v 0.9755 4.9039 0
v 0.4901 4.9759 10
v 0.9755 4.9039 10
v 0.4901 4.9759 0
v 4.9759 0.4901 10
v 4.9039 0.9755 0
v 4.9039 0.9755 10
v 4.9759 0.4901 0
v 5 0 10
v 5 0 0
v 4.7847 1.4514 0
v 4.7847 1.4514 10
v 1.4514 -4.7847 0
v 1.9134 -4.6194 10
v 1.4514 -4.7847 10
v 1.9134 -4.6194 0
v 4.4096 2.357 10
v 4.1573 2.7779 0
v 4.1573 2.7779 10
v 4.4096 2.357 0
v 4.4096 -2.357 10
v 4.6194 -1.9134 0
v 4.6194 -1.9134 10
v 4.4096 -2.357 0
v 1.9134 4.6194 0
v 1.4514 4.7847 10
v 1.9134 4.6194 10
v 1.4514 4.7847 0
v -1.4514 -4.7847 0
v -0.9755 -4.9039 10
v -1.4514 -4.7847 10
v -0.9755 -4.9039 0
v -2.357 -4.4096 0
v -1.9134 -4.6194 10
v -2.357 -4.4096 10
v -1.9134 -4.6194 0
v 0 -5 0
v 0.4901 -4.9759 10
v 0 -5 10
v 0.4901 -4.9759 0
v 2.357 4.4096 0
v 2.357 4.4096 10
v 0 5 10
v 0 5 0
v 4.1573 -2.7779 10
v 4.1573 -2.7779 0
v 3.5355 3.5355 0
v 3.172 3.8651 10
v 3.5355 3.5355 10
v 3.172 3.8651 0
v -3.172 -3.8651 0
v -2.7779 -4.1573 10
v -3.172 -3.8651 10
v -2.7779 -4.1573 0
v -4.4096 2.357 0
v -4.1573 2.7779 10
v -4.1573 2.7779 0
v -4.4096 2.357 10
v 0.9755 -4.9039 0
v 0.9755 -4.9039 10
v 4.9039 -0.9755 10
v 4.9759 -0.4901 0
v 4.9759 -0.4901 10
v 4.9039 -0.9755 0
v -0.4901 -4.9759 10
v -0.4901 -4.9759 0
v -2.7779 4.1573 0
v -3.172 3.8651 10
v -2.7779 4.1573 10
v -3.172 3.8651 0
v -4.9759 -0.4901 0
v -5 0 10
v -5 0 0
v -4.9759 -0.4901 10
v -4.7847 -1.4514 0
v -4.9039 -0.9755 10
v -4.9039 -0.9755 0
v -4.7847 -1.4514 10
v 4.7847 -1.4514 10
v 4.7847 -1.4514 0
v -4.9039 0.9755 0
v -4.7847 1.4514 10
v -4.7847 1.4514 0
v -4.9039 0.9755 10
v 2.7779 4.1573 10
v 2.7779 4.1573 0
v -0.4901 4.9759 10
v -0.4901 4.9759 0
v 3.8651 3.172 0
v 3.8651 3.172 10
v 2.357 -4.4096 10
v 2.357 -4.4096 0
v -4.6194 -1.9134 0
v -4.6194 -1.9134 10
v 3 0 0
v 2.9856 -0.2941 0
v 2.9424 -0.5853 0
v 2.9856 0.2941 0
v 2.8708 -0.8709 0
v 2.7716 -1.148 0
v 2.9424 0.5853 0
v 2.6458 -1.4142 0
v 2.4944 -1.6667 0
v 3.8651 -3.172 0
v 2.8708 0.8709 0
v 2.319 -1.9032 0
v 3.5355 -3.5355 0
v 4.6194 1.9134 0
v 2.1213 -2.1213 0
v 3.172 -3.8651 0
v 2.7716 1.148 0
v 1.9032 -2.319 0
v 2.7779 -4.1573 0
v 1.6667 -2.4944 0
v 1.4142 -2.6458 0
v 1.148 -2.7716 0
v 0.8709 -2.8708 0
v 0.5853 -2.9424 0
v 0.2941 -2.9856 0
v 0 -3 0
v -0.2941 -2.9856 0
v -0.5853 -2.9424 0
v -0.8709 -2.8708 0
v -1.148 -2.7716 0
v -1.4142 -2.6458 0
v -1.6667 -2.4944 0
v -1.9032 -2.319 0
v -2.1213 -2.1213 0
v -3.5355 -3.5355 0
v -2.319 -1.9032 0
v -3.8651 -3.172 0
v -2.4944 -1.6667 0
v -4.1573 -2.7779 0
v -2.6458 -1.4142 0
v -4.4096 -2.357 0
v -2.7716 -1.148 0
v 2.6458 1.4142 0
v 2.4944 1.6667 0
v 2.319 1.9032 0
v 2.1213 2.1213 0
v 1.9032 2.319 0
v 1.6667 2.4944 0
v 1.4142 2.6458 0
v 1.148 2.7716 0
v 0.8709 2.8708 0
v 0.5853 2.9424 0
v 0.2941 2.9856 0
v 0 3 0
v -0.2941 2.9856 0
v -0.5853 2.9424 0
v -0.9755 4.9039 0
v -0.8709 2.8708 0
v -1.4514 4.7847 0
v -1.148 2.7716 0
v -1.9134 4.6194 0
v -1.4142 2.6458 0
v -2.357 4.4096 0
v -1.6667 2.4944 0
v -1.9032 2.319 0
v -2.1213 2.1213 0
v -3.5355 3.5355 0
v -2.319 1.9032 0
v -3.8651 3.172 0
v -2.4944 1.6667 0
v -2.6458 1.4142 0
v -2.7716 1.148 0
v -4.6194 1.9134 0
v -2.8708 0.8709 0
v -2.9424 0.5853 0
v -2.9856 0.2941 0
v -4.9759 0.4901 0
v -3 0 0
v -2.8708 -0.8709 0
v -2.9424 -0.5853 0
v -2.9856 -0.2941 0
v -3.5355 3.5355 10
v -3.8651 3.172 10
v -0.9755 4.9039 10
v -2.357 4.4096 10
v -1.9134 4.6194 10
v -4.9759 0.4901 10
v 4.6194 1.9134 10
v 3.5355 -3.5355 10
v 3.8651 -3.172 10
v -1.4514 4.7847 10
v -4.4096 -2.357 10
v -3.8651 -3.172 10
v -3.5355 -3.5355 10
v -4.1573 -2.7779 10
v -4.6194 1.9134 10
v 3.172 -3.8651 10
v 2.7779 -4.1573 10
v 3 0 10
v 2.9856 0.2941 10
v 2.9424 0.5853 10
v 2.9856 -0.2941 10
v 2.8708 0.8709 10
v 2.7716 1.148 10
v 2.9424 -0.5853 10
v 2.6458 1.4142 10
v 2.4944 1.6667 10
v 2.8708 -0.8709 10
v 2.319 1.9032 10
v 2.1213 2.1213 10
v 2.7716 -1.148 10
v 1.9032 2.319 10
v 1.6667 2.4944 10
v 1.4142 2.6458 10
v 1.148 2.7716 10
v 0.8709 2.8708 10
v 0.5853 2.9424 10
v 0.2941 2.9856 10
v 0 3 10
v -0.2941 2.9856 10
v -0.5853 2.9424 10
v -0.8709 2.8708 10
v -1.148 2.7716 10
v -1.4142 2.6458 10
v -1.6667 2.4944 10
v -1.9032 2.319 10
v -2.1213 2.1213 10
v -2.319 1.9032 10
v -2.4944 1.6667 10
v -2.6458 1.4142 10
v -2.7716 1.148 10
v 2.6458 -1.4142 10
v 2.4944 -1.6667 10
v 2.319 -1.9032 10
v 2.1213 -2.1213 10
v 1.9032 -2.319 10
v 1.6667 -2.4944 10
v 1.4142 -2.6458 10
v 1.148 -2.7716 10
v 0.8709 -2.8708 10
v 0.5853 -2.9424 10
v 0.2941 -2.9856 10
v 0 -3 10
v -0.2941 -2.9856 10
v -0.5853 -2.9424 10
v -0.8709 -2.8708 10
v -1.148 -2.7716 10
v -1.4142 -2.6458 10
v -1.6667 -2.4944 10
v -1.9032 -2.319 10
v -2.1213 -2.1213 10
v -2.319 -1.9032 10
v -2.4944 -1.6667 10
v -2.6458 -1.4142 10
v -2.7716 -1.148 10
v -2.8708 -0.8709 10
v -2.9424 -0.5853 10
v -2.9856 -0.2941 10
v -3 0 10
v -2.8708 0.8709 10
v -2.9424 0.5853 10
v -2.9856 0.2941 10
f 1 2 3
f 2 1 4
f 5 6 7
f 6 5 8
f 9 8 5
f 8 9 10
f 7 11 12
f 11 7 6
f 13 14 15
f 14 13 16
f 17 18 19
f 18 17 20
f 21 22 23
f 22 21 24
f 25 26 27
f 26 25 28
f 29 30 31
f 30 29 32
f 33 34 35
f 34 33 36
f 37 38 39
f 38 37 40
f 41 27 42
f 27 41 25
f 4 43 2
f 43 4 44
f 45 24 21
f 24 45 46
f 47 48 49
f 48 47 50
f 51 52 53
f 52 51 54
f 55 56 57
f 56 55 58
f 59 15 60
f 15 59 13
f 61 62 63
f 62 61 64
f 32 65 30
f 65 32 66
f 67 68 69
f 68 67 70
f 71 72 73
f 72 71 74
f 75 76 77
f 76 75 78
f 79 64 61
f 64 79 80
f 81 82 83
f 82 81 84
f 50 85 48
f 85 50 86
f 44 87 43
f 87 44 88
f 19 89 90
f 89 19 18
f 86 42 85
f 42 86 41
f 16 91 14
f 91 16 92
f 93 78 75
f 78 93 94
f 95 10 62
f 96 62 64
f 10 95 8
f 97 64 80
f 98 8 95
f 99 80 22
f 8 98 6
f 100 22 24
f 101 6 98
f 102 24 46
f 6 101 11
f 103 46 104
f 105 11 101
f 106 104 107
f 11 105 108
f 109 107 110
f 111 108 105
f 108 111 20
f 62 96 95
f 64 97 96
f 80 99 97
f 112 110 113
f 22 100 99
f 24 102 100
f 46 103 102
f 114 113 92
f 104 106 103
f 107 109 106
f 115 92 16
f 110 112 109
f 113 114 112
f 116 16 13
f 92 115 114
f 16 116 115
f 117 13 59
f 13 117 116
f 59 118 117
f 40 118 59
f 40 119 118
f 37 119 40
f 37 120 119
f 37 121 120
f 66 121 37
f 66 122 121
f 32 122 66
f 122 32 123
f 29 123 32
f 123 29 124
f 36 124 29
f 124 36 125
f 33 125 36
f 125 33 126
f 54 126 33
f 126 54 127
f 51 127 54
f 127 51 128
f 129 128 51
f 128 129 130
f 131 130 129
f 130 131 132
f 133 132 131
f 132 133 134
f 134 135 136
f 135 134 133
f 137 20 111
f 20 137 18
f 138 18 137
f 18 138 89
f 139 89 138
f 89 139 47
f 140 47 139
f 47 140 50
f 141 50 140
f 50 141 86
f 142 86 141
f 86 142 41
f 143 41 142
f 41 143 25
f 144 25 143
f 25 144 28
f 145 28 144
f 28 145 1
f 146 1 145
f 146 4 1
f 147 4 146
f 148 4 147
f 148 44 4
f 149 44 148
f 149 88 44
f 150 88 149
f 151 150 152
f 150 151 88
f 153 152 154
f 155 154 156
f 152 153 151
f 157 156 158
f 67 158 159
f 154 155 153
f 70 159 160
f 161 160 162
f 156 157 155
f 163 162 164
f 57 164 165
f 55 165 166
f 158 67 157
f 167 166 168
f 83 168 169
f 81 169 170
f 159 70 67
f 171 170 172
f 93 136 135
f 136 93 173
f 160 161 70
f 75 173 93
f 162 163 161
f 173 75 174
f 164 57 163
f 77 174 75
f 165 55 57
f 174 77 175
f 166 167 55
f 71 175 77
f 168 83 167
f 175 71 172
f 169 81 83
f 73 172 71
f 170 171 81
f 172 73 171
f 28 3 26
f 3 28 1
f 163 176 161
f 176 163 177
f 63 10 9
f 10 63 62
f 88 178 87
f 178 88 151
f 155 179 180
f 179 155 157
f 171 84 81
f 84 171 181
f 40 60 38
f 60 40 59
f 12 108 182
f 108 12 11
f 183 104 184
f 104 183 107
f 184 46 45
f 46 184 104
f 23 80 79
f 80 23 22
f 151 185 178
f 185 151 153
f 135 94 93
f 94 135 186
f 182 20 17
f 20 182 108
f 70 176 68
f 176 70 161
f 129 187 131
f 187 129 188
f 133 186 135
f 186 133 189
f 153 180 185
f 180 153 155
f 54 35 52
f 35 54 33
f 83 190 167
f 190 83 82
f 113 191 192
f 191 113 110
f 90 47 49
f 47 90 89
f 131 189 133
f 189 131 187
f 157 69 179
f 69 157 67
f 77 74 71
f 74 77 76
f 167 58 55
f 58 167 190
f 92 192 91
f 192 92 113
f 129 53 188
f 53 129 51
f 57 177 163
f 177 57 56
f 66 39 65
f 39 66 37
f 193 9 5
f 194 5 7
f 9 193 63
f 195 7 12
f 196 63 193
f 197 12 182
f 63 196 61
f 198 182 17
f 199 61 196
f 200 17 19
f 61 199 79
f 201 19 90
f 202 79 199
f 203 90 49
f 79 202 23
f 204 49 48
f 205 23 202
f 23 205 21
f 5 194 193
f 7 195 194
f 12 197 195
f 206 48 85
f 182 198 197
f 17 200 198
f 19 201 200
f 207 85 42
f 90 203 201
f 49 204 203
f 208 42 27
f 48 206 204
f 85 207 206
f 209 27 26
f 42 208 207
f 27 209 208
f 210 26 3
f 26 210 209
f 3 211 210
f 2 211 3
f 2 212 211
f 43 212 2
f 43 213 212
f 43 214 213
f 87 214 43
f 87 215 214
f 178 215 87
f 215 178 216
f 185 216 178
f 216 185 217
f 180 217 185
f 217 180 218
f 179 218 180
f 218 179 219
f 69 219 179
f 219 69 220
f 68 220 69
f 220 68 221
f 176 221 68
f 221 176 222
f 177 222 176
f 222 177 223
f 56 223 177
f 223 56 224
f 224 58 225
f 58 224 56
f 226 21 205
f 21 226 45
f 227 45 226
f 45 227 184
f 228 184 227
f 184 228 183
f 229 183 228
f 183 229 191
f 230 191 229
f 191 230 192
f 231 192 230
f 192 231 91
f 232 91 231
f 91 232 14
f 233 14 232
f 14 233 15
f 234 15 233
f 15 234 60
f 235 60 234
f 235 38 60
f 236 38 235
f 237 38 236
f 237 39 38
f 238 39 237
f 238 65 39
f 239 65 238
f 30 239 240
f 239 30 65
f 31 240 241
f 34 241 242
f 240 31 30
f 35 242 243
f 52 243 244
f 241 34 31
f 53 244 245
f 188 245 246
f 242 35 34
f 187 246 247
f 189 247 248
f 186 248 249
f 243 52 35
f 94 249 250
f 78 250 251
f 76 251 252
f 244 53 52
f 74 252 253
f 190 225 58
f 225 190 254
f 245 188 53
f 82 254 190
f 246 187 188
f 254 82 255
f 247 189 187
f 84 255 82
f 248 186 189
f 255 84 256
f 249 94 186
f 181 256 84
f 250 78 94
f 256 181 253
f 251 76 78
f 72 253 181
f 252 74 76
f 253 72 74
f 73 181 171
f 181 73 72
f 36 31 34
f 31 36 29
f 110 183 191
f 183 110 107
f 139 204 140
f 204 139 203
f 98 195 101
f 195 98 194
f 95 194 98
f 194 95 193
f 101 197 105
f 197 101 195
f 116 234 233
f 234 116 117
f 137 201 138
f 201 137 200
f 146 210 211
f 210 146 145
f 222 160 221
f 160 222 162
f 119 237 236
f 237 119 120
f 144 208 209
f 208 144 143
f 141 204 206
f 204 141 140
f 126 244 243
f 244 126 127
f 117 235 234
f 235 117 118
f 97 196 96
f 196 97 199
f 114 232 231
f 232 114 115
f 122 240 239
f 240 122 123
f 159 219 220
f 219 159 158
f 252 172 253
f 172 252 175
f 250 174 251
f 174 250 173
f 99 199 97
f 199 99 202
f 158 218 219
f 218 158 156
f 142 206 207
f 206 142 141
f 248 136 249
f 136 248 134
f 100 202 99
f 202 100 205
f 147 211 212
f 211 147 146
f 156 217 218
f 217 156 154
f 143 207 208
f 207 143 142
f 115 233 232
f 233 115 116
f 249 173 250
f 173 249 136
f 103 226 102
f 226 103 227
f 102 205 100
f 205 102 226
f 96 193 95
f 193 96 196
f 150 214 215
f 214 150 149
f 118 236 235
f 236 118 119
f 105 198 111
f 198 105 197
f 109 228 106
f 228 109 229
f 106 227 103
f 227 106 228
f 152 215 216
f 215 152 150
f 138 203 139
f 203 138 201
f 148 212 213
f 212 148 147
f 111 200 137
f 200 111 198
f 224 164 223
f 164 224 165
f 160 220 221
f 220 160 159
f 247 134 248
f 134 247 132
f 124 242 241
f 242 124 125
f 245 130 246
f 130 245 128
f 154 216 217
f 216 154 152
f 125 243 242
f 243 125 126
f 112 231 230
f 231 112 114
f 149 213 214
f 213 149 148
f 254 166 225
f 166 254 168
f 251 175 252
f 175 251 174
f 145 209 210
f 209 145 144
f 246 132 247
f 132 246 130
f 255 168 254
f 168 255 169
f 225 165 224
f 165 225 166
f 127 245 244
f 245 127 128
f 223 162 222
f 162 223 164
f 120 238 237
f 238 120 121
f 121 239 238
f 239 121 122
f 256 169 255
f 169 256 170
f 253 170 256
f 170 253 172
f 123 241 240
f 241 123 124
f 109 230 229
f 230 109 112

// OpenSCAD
module magnet() {
    difference() {
        cylinder(h=10, r=5, $fn=64);
        translate([0, 0, -1])
            cylinder(h=12, r=3, $fn=64);
    }
}

magnet();
